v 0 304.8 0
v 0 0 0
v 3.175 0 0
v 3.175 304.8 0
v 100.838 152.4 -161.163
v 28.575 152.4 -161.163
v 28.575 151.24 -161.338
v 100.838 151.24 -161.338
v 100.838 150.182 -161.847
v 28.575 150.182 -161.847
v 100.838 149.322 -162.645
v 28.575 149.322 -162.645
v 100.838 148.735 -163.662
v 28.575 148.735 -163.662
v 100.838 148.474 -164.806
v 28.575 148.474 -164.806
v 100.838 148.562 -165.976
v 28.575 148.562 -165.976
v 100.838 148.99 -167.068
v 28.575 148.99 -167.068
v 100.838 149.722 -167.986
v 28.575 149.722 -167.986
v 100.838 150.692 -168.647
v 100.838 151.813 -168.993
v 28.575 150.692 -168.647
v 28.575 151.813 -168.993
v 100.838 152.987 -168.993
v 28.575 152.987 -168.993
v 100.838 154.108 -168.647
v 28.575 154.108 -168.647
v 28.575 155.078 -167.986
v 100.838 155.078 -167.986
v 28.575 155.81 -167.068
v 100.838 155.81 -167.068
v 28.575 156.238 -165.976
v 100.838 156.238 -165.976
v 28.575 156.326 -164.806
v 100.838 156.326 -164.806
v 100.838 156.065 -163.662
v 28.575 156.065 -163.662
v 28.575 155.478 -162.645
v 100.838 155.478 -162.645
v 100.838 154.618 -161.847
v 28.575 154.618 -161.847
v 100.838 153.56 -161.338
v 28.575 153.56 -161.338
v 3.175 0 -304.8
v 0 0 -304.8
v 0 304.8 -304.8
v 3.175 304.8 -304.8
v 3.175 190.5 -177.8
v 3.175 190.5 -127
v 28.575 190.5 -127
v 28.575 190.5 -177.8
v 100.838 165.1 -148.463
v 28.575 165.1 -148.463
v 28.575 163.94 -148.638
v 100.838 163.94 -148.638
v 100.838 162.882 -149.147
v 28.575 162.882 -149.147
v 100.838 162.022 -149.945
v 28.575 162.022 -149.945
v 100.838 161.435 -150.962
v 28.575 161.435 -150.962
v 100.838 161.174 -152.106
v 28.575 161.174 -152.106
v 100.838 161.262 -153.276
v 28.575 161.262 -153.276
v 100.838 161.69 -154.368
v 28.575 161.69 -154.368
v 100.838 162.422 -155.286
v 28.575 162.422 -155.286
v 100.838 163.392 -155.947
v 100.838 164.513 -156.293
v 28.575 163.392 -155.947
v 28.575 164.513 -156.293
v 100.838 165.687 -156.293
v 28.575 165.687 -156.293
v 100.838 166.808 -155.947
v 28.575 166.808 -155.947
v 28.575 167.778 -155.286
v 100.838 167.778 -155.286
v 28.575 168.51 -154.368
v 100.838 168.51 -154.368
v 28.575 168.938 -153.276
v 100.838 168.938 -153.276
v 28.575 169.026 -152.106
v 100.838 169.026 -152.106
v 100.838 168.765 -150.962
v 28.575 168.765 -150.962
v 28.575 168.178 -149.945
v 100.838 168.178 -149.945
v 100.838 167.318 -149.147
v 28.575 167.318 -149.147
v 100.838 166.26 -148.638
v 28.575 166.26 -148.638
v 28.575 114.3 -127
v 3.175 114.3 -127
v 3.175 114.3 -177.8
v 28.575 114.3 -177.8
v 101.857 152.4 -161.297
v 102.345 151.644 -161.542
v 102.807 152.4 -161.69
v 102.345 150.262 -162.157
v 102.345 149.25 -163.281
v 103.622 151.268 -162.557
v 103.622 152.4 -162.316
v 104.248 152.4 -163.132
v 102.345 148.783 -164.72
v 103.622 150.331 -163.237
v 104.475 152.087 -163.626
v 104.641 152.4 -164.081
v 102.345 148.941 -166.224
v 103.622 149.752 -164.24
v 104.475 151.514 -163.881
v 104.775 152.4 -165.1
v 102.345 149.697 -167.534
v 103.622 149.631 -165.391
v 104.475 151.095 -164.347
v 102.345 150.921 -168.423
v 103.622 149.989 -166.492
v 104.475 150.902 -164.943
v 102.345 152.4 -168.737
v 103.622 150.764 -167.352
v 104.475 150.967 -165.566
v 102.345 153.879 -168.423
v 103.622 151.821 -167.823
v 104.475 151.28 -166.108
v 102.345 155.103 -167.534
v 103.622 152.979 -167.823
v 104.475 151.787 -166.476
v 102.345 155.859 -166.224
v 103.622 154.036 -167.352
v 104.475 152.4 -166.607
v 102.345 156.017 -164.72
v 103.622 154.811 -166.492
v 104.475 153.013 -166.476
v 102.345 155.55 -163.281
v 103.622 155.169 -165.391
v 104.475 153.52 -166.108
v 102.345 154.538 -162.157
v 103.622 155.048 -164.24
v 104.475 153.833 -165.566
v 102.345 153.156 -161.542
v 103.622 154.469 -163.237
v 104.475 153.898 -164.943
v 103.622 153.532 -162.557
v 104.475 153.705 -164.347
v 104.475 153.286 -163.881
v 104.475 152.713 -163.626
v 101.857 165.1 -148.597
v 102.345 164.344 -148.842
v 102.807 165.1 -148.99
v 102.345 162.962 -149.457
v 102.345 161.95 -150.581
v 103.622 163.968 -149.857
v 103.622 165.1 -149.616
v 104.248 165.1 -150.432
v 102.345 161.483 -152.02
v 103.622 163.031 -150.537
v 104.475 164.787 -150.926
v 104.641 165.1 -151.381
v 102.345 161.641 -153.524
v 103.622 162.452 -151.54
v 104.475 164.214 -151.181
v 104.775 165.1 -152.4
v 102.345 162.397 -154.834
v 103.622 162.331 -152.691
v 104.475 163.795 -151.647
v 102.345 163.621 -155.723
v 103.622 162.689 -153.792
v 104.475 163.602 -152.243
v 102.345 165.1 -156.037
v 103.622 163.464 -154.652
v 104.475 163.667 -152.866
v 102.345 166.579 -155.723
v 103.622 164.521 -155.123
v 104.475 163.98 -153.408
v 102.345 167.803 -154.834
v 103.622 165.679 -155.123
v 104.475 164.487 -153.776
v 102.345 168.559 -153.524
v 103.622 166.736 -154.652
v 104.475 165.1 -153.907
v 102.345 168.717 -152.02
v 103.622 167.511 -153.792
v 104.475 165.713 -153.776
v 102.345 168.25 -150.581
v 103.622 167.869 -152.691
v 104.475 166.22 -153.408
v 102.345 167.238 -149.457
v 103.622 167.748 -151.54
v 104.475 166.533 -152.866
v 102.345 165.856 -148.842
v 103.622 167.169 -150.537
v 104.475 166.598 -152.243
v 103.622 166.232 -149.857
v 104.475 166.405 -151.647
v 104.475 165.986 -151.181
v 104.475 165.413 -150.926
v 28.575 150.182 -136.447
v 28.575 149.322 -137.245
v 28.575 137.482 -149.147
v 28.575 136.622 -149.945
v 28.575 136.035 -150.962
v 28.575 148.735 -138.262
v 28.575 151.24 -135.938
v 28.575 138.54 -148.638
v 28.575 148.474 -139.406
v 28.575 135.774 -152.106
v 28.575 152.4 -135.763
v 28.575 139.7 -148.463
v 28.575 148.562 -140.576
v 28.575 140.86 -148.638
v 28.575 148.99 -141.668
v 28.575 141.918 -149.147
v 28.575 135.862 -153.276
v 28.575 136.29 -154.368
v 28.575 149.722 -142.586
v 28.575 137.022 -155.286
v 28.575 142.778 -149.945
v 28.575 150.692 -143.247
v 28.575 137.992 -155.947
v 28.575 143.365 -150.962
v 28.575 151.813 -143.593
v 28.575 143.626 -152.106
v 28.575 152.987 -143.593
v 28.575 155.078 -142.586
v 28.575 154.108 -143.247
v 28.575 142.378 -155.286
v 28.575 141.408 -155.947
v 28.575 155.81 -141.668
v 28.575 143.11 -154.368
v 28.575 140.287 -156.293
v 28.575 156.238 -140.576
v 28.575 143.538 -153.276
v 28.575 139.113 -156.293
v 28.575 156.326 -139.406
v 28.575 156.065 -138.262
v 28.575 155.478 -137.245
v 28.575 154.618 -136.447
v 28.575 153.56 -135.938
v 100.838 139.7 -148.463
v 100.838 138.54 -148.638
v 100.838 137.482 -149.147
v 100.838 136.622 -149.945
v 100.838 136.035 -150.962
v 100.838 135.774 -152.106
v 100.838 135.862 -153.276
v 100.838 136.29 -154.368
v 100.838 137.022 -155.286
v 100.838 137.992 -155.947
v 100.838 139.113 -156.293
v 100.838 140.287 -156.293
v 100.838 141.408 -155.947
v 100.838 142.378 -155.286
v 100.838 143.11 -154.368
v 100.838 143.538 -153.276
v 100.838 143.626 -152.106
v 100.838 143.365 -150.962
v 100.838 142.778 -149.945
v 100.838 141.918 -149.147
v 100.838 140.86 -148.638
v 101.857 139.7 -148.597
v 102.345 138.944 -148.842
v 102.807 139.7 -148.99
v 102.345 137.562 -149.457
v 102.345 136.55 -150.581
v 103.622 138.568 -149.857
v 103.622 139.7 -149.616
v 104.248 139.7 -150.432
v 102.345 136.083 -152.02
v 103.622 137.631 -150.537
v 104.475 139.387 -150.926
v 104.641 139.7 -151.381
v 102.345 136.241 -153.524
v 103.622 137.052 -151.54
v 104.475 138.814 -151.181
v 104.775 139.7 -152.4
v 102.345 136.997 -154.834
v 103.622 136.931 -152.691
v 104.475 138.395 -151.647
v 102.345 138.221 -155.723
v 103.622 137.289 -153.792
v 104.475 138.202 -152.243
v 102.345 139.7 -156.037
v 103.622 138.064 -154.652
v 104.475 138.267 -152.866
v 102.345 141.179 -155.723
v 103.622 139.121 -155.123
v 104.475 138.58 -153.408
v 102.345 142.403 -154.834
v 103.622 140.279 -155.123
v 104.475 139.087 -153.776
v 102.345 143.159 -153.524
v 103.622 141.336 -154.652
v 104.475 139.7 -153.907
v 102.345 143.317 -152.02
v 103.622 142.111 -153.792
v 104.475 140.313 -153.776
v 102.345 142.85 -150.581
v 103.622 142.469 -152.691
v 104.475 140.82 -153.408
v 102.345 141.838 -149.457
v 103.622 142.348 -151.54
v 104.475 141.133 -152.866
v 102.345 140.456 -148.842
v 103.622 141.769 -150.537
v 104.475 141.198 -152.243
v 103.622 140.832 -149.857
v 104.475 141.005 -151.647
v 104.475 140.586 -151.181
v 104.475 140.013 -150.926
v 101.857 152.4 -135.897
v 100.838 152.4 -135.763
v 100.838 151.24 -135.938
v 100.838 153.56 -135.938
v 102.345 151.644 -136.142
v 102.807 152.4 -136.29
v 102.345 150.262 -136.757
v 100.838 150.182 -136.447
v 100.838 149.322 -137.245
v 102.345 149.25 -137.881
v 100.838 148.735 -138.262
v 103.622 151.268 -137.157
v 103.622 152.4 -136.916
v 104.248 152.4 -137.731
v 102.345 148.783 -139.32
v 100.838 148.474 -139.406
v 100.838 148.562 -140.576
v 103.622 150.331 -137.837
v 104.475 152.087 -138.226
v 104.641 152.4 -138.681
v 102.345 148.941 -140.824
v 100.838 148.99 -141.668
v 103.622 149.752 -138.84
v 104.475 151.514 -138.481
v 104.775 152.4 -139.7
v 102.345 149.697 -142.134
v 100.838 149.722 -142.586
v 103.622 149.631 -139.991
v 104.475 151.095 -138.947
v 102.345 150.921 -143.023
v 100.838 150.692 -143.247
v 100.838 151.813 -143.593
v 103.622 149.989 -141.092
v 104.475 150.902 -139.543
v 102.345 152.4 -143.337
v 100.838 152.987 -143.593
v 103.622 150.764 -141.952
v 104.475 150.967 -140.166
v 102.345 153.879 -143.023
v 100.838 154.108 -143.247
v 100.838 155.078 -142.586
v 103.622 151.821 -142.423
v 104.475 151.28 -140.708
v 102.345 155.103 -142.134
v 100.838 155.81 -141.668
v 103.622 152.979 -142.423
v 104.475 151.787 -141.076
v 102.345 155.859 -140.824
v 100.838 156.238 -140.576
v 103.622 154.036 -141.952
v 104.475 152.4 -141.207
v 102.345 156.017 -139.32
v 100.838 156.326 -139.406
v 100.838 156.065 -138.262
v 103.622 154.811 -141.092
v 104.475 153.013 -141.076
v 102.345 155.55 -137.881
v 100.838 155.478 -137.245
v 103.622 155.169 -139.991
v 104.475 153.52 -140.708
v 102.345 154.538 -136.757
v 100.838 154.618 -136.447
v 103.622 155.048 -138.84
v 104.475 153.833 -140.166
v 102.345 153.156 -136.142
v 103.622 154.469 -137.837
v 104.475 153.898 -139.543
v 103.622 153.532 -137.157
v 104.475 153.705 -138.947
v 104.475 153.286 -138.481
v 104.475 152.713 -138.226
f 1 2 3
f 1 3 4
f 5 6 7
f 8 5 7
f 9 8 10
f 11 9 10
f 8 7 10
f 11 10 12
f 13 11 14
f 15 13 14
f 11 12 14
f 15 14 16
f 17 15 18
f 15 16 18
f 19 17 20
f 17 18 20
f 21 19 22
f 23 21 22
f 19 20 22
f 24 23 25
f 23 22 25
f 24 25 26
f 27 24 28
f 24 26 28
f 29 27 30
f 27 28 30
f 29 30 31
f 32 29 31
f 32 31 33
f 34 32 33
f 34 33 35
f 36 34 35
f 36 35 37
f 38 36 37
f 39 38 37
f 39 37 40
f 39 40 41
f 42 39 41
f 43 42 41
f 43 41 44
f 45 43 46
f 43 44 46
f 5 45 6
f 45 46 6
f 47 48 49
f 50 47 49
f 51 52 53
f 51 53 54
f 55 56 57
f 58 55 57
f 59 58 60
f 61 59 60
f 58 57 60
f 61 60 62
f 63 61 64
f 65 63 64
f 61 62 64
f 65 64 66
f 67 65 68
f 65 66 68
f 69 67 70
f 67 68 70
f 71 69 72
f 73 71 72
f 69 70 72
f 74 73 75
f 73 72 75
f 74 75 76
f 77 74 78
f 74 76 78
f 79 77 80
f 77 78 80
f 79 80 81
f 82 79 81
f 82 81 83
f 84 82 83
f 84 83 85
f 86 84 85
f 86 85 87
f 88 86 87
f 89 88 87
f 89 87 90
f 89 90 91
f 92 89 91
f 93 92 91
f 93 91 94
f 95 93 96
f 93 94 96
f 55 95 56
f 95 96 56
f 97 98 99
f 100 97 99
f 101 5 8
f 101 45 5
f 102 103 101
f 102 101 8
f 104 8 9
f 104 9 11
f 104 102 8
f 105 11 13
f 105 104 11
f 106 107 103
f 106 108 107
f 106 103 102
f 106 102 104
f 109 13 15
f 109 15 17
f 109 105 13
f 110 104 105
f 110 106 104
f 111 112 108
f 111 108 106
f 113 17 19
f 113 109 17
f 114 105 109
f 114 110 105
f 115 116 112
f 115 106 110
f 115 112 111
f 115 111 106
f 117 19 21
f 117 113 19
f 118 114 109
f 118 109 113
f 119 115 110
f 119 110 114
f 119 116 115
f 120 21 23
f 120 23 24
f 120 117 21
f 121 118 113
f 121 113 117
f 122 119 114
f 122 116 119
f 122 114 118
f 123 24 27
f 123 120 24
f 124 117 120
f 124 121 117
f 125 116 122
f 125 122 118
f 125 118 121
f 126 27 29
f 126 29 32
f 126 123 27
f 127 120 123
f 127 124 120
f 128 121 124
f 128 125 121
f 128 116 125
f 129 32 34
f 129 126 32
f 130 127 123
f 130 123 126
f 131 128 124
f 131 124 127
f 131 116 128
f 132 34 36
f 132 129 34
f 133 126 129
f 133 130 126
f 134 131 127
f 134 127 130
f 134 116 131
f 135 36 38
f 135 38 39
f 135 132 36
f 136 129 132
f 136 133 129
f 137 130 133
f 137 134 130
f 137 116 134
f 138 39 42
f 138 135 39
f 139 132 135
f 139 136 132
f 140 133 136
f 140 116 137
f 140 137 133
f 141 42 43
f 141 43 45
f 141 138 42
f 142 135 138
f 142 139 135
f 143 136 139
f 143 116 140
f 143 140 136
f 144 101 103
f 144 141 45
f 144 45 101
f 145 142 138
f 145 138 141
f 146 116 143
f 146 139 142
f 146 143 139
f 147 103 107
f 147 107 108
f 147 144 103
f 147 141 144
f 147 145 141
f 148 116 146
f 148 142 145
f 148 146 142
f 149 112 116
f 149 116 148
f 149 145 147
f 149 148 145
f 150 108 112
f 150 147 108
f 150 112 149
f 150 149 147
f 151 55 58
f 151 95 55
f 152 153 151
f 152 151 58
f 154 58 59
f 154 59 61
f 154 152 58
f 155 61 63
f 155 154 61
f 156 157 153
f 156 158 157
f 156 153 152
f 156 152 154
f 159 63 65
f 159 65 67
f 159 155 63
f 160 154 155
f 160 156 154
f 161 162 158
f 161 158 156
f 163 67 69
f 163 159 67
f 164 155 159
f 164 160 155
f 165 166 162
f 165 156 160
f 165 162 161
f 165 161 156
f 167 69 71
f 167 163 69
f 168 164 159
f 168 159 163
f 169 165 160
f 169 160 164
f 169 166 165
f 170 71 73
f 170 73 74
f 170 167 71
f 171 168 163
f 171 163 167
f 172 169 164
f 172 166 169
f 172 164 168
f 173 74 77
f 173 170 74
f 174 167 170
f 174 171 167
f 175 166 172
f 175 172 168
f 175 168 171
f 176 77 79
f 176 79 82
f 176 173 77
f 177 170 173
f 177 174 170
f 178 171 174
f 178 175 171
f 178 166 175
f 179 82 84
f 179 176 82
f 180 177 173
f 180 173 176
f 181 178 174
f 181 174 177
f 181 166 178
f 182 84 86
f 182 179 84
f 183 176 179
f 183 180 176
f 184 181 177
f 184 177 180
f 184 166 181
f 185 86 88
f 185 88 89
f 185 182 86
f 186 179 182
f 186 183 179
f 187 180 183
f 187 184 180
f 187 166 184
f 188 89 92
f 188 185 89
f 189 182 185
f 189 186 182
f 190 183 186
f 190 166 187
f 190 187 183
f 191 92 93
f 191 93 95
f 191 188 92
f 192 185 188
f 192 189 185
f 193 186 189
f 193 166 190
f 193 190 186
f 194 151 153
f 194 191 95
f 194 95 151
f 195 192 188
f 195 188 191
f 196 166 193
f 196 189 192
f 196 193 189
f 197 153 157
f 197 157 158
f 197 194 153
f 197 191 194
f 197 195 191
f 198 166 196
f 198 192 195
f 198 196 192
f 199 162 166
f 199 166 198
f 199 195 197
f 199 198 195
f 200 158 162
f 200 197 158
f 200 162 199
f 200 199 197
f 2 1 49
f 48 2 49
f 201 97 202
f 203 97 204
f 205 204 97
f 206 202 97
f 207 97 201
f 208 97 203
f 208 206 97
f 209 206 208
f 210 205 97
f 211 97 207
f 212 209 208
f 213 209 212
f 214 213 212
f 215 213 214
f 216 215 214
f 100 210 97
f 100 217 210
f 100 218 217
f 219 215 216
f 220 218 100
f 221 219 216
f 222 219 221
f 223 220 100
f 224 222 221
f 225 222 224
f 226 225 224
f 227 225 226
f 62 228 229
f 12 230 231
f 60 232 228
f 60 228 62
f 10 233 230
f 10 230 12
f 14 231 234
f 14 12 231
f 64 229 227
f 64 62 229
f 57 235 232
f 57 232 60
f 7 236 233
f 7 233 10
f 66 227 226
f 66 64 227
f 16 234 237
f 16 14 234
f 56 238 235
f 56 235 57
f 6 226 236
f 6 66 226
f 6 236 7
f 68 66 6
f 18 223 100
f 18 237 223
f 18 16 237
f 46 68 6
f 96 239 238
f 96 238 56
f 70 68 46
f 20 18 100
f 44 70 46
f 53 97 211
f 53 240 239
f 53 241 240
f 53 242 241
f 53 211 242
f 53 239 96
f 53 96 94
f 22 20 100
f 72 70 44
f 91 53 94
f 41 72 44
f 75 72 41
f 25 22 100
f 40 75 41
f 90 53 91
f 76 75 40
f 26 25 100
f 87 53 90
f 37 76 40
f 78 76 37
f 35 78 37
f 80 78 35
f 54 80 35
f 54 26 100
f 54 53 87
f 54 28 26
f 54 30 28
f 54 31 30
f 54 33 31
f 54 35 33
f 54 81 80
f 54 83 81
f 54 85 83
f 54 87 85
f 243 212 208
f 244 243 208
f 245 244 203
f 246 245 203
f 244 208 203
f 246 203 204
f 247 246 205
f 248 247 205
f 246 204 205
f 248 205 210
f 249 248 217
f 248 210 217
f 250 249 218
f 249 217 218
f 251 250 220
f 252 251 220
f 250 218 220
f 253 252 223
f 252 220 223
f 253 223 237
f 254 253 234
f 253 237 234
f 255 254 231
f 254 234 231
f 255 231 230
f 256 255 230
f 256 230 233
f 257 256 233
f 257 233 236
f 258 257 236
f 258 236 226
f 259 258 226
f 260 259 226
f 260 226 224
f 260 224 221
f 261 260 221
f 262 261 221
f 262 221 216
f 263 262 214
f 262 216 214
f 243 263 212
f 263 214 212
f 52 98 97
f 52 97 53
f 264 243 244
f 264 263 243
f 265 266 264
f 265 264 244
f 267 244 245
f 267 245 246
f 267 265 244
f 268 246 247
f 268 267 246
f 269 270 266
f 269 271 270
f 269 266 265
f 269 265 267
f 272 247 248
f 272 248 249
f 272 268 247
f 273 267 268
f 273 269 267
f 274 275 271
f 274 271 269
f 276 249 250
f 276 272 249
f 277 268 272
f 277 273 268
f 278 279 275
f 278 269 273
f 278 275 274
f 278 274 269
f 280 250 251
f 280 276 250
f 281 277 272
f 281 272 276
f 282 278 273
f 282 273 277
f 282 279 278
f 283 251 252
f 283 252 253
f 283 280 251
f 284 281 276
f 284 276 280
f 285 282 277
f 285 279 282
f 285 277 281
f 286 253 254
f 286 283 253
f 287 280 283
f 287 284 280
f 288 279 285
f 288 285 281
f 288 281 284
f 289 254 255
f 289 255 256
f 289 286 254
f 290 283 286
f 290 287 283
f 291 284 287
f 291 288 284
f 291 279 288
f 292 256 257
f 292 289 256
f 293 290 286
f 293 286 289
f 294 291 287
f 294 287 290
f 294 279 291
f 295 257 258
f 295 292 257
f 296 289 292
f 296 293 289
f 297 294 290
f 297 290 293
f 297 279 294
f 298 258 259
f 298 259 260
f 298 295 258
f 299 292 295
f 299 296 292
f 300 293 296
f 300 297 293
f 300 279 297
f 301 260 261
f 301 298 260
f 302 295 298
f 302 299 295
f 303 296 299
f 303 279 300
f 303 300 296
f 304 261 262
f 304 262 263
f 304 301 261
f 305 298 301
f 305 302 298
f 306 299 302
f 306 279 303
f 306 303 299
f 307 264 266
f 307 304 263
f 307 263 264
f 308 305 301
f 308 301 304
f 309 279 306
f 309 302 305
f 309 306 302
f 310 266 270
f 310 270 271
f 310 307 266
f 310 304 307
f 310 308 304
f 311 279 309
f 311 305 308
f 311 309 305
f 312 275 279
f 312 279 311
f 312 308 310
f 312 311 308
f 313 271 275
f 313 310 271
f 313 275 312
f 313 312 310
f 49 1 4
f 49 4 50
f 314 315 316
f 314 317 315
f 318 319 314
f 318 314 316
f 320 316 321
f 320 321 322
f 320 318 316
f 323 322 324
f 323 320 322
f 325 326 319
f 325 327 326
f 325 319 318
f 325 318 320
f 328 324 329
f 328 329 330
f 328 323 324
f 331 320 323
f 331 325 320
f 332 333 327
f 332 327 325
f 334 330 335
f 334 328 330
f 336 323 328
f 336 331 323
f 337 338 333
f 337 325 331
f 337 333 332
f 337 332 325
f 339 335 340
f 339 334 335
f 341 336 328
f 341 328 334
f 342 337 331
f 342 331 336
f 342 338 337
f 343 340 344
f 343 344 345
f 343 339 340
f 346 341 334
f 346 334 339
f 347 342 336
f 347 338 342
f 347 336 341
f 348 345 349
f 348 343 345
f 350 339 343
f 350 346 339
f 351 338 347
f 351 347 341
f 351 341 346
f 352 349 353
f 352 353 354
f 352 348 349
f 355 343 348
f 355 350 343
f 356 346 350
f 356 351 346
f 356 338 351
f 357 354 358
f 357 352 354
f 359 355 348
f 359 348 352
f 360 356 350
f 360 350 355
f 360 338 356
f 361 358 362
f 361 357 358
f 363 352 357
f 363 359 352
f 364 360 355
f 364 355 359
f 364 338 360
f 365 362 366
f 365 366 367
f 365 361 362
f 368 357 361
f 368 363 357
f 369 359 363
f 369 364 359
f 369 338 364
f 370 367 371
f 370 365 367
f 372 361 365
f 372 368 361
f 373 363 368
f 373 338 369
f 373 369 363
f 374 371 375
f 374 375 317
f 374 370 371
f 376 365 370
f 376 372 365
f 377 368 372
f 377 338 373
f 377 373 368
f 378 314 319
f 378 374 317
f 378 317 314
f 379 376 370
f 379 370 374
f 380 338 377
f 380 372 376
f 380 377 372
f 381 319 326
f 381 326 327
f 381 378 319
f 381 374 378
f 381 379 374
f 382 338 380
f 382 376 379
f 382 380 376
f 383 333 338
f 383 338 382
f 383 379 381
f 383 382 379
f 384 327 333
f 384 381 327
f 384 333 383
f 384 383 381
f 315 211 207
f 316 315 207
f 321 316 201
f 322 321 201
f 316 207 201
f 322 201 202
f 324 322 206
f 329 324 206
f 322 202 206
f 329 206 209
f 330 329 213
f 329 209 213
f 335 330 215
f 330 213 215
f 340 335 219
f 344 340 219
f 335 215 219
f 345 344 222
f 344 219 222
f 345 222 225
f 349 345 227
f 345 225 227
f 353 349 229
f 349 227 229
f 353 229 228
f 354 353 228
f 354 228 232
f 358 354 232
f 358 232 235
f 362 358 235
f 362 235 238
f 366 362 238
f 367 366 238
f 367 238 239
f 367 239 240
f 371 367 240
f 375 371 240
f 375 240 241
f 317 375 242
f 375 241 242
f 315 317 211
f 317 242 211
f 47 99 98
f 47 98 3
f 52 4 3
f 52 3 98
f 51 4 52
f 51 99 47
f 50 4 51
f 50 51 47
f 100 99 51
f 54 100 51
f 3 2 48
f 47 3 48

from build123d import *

# Parameters (mm, degrees)
SKETCH1_W           = 304.8
SKETCH1_H           = 304.8
BOSS_EXTRUDE1_DEPTH = 3.175
SKETCH2_W           = 50.8
SKETCH2_H           = 76.2
BOSS_EXTRUDE2_DEPTH = 25.4
SKETCH3_R           = 3.937
BOSS_EXTRUDE3_DEPTH = 76.2
FILLET2_R           = 3.937


with BuildPart() as part:
    # Sketch1 → Boss-Extrude1 (new body)
    with BuildSketch(Plane(origin=(0, 0, 0), x_dir=(0, 0, -1), z_dir=(1, 0, 0))):
        with Locations((152.4, 152.4)):
            Rectangle(SKETCH1_W, SKETCH1_H)
    extrude(amount=BOSS_EXTRUDE1_DEPTH)

    # Sketch2 → Boss-Extrude2 (add)
    with BuildSketch(Plane(origin=(3.175, 0, 0), x_dir=(0, 0, -1), z_dir=(1, 0, 0))):
        with Locations((152.4, 152.4)):
            Rectangle(SKETCH2_W, SKETCH2_H)
    extrude(amount=BOSS_EXTRUDE2_DEPTH)

    # Sketch3 → Boss-Extrude3 (add)
    with BuildSketch(Plane(origin=(28.575, 0, 0), x_dir=(0, 0, -1), z_dir=(1, 0, 0))):
        with Locations(Location((152.4, 139.7, 0), (0, 0, 180))):
            Circle(SKETCH3_R)
        with Locations(Location((165.1, 152.4, 0), (0, 0, 180))):
            Circle(SKETCH3_R)
        with Locations(Location((152.4, 165.1, 0), (0, 0, 180))):
            Circle(SKETCH3_R)
        with Locations(Location((139.7, 152.4, 0), (0, 0, 180))):
            Circle(SKETCH3_R)
    extrude(amount=BOSS_EXTRUDE3_DEPTH)

    # Fillet2
    fillet2_edges = [part.edges().sort_by_distance(p)[0] for p in [
        (104.775, 139.7, -156.337),
        (104.775, 152.4, -169.037),
        (104.775, 165.1, -156.337),
        (104.775, 152.4, -143.637),
    ]]
    fillet(fillet2_edges, radius=FILLET2_R)


solid = part.part
